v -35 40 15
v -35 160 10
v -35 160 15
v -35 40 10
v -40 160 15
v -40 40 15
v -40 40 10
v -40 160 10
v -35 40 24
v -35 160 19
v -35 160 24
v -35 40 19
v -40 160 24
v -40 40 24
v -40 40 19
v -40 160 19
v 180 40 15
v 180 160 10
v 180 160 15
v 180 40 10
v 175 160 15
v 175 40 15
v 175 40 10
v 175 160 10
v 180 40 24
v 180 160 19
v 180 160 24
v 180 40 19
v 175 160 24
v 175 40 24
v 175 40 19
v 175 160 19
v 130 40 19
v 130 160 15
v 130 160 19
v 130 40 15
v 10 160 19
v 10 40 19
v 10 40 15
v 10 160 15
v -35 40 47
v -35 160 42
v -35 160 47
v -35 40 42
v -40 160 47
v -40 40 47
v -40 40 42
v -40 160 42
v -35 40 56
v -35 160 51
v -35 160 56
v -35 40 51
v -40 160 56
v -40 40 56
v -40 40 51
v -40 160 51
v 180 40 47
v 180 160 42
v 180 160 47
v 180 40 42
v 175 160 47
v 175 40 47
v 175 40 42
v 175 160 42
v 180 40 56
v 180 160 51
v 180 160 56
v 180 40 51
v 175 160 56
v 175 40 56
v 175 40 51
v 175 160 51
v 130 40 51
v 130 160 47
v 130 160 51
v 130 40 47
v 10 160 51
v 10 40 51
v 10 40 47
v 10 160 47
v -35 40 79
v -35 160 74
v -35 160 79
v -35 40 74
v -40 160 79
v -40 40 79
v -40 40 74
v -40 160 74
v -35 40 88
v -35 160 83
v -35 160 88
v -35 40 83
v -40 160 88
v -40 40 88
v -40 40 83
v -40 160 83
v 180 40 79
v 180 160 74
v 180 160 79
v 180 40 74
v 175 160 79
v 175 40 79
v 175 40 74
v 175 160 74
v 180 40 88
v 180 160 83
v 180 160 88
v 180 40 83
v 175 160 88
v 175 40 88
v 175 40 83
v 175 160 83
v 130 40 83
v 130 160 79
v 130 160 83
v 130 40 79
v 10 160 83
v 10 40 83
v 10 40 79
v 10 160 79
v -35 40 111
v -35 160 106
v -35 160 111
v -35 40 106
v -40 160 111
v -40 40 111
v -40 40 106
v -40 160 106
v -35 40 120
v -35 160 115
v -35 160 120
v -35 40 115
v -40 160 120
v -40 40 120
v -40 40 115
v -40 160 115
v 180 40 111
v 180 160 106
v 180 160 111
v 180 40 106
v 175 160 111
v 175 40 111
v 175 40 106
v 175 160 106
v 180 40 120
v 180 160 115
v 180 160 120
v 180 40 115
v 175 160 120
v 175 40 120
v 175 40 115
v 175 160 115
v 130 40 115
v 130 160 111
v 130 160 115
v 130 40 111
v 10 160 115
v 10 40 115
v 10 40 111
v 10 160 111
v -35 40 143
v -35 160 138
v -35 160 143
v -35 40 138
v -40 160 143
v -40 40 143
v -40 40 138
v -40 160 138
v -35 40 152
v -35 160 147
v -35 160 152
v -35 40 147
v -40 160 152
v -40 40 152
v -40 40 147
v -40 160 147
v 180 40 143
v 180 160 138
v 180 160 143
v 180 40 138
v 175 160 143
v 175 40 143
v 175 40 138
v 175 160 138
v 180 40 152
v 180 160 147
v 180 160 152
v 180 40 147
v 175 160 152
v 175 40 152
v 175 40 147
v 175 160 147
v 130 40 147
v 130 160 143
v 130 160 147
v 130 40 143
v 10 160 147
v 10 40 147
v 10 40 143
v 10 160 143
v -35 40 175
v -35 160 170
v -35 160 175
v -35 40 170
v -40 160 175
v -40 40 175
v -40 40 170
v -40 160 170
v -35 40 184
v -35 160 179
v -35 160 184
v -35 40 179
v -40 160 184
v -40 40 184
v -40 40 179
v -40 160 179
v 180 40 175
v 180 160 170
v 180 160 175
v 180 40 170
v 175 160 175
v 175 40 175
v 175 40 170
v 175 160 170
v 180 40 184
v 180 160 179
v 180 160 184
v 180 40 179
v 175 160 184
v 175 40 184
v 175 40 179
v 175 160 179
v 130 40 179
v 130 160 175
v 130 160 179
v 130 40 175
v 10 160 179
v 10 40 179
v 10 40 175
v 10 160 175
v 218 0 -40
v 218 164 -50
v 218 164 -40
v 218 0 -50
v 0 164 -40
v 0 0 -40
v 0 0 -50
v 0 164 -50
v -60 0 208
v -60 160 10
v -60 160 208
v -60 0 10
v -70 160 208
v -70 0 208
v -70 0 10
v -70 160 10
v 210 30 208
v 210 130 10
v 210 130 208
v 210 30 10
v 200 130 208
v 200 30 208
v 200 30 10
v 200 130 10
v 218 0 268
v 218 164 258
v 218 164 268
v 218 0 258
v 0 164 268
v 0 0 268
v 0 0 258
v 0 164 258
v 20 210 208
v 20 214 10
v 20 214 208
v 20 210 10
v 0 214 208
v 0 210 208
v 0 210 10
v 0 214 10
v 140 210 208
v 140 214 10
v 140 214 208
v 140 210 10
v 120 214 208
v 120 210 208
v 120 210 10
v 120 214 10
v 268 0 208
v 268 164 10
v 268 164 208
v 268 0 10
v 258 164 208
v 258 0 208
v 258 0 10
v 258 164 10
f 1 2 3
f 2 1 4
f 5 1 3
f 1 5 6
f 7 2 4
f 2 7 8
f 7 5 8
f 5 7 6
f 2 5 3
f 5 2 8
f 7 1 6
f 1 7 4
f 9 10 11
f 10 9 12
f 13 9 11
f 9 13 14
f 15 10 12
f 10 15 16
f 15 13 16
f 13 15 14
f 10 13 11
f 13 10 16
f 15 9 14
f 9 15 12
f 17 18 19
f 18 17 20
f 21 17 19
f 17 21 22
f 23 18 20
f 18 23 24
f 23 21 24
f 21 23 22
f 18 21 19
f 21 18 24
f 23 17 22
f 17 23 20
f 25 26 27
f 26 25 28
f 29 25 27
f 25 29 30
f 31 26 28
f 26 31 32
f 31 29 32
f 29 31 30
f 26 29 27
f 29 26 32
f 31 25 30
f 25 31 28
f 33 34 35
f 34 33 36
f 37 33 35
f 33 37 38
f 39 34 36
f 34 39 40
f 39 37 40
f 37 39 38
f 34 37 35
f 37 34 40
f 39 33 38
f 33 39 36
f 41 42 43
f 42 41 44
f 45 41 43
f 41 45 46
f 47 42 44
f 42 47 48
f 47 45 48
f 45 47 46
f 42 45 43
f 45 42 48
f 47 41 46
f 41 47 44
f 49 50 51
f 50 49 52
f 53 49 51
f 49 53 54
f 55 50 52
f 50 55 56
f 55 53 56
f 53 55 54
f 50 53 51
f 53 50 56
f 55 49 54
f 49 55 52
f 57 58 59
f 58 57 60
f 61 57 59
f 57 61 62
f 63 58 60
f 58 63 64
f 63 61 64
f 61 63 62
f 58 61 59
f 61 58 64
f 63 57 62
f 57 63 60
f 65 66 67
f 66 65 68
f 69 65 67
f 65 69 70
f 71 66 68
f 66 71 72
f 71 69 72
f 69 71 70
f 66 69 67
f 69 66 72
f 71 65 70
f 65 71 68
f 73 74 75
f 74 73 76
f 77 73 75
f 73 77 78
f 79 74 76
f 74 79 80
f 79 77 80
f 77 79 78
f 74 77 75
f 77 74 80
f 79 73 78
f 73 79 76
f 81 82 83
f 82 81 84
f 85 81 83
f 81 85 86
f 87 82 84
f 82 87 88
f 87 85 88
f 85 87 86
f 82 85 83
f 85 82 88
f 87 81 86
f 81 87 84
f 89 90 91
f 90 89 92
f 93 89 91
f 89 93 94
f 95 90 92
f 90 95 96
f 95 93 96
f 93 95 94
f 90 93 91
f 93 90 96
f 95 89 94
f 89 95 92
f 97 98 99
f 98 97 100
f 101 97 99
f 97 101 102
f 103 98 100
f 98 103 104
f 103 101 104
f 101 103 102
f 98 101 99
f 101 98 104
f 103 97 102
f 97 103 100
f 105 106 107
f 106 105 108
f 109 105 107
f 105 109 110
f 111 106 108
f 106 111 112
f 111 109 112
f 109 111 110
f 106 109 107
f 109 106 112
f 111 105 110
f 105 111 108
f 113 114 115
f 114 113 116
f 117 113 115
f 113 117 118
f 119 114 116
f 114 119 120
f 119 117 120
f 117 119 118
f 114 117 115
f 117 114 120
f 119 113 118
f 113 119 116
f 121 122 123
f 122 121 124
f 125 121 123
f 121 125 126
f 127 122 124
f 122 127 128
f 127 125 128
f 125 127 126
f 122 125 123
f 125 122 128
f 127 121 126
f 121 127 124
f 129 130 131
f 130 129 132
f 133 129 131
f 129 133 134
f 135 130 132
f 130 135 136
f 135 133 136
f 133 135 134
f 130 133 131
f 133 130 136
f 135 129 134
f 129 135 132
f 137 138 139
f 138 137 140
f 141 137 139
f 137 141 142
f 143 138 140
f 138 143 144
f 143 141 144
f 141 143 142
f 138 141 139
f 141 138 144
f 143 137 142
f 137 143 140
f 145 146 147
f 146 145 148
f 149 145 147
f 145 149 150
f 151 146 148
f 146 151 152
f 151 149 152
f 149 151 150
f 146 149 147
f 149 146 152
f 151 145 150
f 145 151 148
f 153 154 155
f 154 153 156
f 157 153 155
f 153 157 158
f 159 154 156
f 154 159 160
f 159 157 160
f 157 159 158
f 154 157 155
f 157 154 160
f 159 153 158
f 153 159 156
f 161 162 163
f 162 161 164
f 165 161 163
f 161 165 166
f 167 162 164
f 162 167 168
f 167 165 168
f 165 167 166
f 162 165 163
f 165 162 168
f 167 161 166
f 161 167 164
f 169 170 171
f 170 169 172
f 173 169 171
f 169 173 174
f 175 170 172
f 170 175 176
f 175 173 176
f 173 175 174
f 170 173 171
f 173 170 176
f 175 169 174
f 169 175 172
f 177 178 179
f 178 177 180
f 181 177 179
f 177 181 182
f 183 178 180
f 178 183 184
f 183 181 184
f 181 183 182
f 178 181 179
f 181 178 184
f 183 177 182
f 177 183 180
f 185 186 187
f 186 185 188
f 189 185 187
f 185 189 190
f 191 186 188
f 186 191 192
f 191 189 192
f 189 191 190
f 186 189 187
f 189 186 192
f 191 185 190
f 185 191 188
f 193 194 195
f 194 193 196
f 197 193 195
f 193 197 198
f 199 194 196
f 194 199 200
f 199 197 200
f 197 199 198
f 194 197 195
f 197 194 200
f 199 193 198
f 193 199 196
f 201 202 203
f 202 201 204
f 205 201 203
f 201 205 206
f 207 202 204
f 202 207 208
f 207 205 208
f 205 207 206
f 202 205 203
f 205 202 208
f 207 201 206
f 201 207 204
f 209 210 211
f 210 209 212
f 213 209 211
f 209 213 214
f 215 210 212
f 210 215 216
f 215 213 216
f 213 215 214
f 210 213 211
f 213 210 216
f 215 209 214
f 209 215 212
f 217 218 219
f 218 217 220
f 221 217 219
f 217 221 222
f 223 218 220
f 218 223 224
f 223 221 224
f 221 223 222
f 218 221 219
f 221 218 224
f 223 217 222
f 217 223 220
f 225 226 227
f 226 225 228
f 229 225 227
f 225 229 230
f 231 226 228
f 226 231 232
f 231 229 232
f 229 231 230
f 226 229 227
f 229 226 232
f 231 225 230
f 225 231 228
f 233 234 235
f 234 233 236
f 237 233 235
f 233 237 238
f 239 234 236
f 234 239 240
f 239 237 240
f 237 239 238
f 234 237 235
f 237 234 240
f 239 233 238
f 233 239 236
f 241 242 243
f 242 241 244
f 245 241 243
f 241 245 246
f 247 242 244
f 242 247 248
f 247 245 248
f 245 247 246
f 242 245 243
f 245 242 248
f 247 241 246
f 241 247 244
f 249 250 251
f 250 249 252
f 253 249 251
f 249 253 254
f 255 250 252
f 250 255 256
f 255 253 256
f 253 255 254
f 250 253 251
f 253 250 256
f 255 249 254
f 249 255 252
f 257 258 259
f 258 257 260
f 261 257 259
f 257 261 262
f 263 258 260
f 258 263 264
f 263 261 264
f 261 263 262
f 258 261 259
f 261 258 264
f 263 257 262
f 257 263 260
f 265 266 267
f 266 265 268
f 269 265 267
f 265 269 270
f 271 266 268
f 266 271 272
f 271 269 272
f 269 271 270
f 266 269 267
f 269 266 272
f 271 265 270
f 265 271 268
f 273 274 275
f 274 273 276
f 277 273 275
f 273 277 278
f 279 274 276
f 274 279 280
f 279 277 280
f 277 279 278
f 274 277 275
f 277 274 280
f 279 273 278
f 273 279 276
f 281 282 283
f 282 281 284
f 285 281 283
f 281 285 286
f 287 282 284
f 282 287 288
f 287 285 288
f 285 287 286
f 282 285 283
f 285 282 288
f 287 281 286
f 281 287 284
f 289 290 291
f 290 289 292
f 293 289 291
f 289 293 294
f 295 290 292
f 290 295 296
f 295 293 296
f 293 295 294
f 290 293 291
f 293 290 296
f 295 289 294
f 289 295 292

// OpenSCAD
expl = 50;
expl2 = 70;
panels_thickness = 10;
slots = 6;
board_gap = 32;
aux_compart_w = 68;
strip_d = 4;
shelf_w = 120;
shelf_d = 120;
shelf_h = 4;
bracket = [5 , shelf_d, 5 ];

shelf2 = [ aux_compart_w, 140, 4 ];

panel_w = panels_thickness;
panel_h = (slots)*(board_gap)+6;
panel_d = 160;
strip = [20, 4, panel_h];

top_cover = [ shelf_w+panel_w*3+aux_compart_w, panel_d+strip_d, panel_w ];

bottom_base = top_cover;

shelf = [shelf_w, shelf_d, shelf_h];
panel_left = [panel_w, panel_d, panel_h];
inter_panel = [panel_w, 100, panel_h];
panel_right = [panel_w, panel_d+strip[1], panel_h];

pwu = [ 102, 51, 21];
pwu_gap = 2;
switch =[158, 101, 25];
switch_gap = 2;


module rjsocket() {
    import("rj45.stl");
}

module OrangePIOne() {
    scale([1.2,1.2,1.23]) {
        import("Orange-pi-one.stl");
    }
}

module make_shelf(x, y, z, shelf) {
    translate([x,y,z]) cube(shelf);
}

module make_bracket(x,y,z, bracket) {
    translate([x, y, z]) color([1,1,1]) cube(bracket);
}    



// create brackets and shelves
for (nz=[0:slots-1]) {
    // top brackets
    make_bracket(panel_w-expl, panel_d-shelf_d,  bracket[2] + bottom_base[2] + nz*board_gap-bracket[2], bracket);
    make_bracket(panel_w-expl, panel_d-shelf_d,  bracket[2] + bottom_base[2] + shelf[2]+bracket[2] + nz*board_gap- bracket[2], bracket);
    make_bracket(shelf_w+panel_w-bracket[0]+expl, panel_d-shelf_d,  bracket[2] + bottom_base[2] + nz*board_gap-bracket[2], bracket);
    make_bracket(shelf_w+panel_w-bracket[0]+expl, panel_d-shelf_d,  bracket[2] + bottom_base[2] + shelf[2]+bracket[2] + nz*board_gap-bracket[2], bracket);
    make_shelf(panel_w, panel_d - shelf_d, bottom_base[2] + bracket[2] + (nz)*board_gap , shelf);

}    

// bottom base
translate([0,0,0-expl]) cube(bottom_base);
//left panel
translate([0-expl2,0,panel_w]) cube(panel_left);
// inter-panel
translate([shelf_w+expl2+panel_w,30,panel_w]) cube(inter_panel);
// top cover
translate([0,0,panel_h+top_cover[2]+expl]) cube(top_cover);

// strips
translate([0, panel_d+expl, bottom_base[2]]) cube(strip);
translate([shelf_w+panel_left[0]*2-strip[0], panel_d+expl, bottom_base[2]]) cube(strip);

// right panel
translate([bottom_base[0]-panel_right[0]+expl, 0, panel_w]) cube(panel_right);

// 2 x 1Gbit switches
/*
translate([168,30, bottom_base[2]]) rotate([0,-90,0]) cube(switch);
translate([155,28, bottom_base[2]+10+30]) rotate([0,270,90]) color([0,1,0]) rjsocket();

// 2 x PWU
translate([200,30, 8 ]) rotate([0,-90,0]) cube(pwu);

module make_board(y) { 
     translate([30, 40, bottom_base[2]+shelf[2]+y+5 ]) 
         rotate([90,0,90]) 
             color([1,0.5,0]) OrangePIOne();
}

for (nz=[0:slots-1]) {
    make_board(nz * board_gap);
}
*/
echo("width: ", panel_h+bottom_base[2]+top_cover[2]);
echo("width: ", bottom_base[0]);
